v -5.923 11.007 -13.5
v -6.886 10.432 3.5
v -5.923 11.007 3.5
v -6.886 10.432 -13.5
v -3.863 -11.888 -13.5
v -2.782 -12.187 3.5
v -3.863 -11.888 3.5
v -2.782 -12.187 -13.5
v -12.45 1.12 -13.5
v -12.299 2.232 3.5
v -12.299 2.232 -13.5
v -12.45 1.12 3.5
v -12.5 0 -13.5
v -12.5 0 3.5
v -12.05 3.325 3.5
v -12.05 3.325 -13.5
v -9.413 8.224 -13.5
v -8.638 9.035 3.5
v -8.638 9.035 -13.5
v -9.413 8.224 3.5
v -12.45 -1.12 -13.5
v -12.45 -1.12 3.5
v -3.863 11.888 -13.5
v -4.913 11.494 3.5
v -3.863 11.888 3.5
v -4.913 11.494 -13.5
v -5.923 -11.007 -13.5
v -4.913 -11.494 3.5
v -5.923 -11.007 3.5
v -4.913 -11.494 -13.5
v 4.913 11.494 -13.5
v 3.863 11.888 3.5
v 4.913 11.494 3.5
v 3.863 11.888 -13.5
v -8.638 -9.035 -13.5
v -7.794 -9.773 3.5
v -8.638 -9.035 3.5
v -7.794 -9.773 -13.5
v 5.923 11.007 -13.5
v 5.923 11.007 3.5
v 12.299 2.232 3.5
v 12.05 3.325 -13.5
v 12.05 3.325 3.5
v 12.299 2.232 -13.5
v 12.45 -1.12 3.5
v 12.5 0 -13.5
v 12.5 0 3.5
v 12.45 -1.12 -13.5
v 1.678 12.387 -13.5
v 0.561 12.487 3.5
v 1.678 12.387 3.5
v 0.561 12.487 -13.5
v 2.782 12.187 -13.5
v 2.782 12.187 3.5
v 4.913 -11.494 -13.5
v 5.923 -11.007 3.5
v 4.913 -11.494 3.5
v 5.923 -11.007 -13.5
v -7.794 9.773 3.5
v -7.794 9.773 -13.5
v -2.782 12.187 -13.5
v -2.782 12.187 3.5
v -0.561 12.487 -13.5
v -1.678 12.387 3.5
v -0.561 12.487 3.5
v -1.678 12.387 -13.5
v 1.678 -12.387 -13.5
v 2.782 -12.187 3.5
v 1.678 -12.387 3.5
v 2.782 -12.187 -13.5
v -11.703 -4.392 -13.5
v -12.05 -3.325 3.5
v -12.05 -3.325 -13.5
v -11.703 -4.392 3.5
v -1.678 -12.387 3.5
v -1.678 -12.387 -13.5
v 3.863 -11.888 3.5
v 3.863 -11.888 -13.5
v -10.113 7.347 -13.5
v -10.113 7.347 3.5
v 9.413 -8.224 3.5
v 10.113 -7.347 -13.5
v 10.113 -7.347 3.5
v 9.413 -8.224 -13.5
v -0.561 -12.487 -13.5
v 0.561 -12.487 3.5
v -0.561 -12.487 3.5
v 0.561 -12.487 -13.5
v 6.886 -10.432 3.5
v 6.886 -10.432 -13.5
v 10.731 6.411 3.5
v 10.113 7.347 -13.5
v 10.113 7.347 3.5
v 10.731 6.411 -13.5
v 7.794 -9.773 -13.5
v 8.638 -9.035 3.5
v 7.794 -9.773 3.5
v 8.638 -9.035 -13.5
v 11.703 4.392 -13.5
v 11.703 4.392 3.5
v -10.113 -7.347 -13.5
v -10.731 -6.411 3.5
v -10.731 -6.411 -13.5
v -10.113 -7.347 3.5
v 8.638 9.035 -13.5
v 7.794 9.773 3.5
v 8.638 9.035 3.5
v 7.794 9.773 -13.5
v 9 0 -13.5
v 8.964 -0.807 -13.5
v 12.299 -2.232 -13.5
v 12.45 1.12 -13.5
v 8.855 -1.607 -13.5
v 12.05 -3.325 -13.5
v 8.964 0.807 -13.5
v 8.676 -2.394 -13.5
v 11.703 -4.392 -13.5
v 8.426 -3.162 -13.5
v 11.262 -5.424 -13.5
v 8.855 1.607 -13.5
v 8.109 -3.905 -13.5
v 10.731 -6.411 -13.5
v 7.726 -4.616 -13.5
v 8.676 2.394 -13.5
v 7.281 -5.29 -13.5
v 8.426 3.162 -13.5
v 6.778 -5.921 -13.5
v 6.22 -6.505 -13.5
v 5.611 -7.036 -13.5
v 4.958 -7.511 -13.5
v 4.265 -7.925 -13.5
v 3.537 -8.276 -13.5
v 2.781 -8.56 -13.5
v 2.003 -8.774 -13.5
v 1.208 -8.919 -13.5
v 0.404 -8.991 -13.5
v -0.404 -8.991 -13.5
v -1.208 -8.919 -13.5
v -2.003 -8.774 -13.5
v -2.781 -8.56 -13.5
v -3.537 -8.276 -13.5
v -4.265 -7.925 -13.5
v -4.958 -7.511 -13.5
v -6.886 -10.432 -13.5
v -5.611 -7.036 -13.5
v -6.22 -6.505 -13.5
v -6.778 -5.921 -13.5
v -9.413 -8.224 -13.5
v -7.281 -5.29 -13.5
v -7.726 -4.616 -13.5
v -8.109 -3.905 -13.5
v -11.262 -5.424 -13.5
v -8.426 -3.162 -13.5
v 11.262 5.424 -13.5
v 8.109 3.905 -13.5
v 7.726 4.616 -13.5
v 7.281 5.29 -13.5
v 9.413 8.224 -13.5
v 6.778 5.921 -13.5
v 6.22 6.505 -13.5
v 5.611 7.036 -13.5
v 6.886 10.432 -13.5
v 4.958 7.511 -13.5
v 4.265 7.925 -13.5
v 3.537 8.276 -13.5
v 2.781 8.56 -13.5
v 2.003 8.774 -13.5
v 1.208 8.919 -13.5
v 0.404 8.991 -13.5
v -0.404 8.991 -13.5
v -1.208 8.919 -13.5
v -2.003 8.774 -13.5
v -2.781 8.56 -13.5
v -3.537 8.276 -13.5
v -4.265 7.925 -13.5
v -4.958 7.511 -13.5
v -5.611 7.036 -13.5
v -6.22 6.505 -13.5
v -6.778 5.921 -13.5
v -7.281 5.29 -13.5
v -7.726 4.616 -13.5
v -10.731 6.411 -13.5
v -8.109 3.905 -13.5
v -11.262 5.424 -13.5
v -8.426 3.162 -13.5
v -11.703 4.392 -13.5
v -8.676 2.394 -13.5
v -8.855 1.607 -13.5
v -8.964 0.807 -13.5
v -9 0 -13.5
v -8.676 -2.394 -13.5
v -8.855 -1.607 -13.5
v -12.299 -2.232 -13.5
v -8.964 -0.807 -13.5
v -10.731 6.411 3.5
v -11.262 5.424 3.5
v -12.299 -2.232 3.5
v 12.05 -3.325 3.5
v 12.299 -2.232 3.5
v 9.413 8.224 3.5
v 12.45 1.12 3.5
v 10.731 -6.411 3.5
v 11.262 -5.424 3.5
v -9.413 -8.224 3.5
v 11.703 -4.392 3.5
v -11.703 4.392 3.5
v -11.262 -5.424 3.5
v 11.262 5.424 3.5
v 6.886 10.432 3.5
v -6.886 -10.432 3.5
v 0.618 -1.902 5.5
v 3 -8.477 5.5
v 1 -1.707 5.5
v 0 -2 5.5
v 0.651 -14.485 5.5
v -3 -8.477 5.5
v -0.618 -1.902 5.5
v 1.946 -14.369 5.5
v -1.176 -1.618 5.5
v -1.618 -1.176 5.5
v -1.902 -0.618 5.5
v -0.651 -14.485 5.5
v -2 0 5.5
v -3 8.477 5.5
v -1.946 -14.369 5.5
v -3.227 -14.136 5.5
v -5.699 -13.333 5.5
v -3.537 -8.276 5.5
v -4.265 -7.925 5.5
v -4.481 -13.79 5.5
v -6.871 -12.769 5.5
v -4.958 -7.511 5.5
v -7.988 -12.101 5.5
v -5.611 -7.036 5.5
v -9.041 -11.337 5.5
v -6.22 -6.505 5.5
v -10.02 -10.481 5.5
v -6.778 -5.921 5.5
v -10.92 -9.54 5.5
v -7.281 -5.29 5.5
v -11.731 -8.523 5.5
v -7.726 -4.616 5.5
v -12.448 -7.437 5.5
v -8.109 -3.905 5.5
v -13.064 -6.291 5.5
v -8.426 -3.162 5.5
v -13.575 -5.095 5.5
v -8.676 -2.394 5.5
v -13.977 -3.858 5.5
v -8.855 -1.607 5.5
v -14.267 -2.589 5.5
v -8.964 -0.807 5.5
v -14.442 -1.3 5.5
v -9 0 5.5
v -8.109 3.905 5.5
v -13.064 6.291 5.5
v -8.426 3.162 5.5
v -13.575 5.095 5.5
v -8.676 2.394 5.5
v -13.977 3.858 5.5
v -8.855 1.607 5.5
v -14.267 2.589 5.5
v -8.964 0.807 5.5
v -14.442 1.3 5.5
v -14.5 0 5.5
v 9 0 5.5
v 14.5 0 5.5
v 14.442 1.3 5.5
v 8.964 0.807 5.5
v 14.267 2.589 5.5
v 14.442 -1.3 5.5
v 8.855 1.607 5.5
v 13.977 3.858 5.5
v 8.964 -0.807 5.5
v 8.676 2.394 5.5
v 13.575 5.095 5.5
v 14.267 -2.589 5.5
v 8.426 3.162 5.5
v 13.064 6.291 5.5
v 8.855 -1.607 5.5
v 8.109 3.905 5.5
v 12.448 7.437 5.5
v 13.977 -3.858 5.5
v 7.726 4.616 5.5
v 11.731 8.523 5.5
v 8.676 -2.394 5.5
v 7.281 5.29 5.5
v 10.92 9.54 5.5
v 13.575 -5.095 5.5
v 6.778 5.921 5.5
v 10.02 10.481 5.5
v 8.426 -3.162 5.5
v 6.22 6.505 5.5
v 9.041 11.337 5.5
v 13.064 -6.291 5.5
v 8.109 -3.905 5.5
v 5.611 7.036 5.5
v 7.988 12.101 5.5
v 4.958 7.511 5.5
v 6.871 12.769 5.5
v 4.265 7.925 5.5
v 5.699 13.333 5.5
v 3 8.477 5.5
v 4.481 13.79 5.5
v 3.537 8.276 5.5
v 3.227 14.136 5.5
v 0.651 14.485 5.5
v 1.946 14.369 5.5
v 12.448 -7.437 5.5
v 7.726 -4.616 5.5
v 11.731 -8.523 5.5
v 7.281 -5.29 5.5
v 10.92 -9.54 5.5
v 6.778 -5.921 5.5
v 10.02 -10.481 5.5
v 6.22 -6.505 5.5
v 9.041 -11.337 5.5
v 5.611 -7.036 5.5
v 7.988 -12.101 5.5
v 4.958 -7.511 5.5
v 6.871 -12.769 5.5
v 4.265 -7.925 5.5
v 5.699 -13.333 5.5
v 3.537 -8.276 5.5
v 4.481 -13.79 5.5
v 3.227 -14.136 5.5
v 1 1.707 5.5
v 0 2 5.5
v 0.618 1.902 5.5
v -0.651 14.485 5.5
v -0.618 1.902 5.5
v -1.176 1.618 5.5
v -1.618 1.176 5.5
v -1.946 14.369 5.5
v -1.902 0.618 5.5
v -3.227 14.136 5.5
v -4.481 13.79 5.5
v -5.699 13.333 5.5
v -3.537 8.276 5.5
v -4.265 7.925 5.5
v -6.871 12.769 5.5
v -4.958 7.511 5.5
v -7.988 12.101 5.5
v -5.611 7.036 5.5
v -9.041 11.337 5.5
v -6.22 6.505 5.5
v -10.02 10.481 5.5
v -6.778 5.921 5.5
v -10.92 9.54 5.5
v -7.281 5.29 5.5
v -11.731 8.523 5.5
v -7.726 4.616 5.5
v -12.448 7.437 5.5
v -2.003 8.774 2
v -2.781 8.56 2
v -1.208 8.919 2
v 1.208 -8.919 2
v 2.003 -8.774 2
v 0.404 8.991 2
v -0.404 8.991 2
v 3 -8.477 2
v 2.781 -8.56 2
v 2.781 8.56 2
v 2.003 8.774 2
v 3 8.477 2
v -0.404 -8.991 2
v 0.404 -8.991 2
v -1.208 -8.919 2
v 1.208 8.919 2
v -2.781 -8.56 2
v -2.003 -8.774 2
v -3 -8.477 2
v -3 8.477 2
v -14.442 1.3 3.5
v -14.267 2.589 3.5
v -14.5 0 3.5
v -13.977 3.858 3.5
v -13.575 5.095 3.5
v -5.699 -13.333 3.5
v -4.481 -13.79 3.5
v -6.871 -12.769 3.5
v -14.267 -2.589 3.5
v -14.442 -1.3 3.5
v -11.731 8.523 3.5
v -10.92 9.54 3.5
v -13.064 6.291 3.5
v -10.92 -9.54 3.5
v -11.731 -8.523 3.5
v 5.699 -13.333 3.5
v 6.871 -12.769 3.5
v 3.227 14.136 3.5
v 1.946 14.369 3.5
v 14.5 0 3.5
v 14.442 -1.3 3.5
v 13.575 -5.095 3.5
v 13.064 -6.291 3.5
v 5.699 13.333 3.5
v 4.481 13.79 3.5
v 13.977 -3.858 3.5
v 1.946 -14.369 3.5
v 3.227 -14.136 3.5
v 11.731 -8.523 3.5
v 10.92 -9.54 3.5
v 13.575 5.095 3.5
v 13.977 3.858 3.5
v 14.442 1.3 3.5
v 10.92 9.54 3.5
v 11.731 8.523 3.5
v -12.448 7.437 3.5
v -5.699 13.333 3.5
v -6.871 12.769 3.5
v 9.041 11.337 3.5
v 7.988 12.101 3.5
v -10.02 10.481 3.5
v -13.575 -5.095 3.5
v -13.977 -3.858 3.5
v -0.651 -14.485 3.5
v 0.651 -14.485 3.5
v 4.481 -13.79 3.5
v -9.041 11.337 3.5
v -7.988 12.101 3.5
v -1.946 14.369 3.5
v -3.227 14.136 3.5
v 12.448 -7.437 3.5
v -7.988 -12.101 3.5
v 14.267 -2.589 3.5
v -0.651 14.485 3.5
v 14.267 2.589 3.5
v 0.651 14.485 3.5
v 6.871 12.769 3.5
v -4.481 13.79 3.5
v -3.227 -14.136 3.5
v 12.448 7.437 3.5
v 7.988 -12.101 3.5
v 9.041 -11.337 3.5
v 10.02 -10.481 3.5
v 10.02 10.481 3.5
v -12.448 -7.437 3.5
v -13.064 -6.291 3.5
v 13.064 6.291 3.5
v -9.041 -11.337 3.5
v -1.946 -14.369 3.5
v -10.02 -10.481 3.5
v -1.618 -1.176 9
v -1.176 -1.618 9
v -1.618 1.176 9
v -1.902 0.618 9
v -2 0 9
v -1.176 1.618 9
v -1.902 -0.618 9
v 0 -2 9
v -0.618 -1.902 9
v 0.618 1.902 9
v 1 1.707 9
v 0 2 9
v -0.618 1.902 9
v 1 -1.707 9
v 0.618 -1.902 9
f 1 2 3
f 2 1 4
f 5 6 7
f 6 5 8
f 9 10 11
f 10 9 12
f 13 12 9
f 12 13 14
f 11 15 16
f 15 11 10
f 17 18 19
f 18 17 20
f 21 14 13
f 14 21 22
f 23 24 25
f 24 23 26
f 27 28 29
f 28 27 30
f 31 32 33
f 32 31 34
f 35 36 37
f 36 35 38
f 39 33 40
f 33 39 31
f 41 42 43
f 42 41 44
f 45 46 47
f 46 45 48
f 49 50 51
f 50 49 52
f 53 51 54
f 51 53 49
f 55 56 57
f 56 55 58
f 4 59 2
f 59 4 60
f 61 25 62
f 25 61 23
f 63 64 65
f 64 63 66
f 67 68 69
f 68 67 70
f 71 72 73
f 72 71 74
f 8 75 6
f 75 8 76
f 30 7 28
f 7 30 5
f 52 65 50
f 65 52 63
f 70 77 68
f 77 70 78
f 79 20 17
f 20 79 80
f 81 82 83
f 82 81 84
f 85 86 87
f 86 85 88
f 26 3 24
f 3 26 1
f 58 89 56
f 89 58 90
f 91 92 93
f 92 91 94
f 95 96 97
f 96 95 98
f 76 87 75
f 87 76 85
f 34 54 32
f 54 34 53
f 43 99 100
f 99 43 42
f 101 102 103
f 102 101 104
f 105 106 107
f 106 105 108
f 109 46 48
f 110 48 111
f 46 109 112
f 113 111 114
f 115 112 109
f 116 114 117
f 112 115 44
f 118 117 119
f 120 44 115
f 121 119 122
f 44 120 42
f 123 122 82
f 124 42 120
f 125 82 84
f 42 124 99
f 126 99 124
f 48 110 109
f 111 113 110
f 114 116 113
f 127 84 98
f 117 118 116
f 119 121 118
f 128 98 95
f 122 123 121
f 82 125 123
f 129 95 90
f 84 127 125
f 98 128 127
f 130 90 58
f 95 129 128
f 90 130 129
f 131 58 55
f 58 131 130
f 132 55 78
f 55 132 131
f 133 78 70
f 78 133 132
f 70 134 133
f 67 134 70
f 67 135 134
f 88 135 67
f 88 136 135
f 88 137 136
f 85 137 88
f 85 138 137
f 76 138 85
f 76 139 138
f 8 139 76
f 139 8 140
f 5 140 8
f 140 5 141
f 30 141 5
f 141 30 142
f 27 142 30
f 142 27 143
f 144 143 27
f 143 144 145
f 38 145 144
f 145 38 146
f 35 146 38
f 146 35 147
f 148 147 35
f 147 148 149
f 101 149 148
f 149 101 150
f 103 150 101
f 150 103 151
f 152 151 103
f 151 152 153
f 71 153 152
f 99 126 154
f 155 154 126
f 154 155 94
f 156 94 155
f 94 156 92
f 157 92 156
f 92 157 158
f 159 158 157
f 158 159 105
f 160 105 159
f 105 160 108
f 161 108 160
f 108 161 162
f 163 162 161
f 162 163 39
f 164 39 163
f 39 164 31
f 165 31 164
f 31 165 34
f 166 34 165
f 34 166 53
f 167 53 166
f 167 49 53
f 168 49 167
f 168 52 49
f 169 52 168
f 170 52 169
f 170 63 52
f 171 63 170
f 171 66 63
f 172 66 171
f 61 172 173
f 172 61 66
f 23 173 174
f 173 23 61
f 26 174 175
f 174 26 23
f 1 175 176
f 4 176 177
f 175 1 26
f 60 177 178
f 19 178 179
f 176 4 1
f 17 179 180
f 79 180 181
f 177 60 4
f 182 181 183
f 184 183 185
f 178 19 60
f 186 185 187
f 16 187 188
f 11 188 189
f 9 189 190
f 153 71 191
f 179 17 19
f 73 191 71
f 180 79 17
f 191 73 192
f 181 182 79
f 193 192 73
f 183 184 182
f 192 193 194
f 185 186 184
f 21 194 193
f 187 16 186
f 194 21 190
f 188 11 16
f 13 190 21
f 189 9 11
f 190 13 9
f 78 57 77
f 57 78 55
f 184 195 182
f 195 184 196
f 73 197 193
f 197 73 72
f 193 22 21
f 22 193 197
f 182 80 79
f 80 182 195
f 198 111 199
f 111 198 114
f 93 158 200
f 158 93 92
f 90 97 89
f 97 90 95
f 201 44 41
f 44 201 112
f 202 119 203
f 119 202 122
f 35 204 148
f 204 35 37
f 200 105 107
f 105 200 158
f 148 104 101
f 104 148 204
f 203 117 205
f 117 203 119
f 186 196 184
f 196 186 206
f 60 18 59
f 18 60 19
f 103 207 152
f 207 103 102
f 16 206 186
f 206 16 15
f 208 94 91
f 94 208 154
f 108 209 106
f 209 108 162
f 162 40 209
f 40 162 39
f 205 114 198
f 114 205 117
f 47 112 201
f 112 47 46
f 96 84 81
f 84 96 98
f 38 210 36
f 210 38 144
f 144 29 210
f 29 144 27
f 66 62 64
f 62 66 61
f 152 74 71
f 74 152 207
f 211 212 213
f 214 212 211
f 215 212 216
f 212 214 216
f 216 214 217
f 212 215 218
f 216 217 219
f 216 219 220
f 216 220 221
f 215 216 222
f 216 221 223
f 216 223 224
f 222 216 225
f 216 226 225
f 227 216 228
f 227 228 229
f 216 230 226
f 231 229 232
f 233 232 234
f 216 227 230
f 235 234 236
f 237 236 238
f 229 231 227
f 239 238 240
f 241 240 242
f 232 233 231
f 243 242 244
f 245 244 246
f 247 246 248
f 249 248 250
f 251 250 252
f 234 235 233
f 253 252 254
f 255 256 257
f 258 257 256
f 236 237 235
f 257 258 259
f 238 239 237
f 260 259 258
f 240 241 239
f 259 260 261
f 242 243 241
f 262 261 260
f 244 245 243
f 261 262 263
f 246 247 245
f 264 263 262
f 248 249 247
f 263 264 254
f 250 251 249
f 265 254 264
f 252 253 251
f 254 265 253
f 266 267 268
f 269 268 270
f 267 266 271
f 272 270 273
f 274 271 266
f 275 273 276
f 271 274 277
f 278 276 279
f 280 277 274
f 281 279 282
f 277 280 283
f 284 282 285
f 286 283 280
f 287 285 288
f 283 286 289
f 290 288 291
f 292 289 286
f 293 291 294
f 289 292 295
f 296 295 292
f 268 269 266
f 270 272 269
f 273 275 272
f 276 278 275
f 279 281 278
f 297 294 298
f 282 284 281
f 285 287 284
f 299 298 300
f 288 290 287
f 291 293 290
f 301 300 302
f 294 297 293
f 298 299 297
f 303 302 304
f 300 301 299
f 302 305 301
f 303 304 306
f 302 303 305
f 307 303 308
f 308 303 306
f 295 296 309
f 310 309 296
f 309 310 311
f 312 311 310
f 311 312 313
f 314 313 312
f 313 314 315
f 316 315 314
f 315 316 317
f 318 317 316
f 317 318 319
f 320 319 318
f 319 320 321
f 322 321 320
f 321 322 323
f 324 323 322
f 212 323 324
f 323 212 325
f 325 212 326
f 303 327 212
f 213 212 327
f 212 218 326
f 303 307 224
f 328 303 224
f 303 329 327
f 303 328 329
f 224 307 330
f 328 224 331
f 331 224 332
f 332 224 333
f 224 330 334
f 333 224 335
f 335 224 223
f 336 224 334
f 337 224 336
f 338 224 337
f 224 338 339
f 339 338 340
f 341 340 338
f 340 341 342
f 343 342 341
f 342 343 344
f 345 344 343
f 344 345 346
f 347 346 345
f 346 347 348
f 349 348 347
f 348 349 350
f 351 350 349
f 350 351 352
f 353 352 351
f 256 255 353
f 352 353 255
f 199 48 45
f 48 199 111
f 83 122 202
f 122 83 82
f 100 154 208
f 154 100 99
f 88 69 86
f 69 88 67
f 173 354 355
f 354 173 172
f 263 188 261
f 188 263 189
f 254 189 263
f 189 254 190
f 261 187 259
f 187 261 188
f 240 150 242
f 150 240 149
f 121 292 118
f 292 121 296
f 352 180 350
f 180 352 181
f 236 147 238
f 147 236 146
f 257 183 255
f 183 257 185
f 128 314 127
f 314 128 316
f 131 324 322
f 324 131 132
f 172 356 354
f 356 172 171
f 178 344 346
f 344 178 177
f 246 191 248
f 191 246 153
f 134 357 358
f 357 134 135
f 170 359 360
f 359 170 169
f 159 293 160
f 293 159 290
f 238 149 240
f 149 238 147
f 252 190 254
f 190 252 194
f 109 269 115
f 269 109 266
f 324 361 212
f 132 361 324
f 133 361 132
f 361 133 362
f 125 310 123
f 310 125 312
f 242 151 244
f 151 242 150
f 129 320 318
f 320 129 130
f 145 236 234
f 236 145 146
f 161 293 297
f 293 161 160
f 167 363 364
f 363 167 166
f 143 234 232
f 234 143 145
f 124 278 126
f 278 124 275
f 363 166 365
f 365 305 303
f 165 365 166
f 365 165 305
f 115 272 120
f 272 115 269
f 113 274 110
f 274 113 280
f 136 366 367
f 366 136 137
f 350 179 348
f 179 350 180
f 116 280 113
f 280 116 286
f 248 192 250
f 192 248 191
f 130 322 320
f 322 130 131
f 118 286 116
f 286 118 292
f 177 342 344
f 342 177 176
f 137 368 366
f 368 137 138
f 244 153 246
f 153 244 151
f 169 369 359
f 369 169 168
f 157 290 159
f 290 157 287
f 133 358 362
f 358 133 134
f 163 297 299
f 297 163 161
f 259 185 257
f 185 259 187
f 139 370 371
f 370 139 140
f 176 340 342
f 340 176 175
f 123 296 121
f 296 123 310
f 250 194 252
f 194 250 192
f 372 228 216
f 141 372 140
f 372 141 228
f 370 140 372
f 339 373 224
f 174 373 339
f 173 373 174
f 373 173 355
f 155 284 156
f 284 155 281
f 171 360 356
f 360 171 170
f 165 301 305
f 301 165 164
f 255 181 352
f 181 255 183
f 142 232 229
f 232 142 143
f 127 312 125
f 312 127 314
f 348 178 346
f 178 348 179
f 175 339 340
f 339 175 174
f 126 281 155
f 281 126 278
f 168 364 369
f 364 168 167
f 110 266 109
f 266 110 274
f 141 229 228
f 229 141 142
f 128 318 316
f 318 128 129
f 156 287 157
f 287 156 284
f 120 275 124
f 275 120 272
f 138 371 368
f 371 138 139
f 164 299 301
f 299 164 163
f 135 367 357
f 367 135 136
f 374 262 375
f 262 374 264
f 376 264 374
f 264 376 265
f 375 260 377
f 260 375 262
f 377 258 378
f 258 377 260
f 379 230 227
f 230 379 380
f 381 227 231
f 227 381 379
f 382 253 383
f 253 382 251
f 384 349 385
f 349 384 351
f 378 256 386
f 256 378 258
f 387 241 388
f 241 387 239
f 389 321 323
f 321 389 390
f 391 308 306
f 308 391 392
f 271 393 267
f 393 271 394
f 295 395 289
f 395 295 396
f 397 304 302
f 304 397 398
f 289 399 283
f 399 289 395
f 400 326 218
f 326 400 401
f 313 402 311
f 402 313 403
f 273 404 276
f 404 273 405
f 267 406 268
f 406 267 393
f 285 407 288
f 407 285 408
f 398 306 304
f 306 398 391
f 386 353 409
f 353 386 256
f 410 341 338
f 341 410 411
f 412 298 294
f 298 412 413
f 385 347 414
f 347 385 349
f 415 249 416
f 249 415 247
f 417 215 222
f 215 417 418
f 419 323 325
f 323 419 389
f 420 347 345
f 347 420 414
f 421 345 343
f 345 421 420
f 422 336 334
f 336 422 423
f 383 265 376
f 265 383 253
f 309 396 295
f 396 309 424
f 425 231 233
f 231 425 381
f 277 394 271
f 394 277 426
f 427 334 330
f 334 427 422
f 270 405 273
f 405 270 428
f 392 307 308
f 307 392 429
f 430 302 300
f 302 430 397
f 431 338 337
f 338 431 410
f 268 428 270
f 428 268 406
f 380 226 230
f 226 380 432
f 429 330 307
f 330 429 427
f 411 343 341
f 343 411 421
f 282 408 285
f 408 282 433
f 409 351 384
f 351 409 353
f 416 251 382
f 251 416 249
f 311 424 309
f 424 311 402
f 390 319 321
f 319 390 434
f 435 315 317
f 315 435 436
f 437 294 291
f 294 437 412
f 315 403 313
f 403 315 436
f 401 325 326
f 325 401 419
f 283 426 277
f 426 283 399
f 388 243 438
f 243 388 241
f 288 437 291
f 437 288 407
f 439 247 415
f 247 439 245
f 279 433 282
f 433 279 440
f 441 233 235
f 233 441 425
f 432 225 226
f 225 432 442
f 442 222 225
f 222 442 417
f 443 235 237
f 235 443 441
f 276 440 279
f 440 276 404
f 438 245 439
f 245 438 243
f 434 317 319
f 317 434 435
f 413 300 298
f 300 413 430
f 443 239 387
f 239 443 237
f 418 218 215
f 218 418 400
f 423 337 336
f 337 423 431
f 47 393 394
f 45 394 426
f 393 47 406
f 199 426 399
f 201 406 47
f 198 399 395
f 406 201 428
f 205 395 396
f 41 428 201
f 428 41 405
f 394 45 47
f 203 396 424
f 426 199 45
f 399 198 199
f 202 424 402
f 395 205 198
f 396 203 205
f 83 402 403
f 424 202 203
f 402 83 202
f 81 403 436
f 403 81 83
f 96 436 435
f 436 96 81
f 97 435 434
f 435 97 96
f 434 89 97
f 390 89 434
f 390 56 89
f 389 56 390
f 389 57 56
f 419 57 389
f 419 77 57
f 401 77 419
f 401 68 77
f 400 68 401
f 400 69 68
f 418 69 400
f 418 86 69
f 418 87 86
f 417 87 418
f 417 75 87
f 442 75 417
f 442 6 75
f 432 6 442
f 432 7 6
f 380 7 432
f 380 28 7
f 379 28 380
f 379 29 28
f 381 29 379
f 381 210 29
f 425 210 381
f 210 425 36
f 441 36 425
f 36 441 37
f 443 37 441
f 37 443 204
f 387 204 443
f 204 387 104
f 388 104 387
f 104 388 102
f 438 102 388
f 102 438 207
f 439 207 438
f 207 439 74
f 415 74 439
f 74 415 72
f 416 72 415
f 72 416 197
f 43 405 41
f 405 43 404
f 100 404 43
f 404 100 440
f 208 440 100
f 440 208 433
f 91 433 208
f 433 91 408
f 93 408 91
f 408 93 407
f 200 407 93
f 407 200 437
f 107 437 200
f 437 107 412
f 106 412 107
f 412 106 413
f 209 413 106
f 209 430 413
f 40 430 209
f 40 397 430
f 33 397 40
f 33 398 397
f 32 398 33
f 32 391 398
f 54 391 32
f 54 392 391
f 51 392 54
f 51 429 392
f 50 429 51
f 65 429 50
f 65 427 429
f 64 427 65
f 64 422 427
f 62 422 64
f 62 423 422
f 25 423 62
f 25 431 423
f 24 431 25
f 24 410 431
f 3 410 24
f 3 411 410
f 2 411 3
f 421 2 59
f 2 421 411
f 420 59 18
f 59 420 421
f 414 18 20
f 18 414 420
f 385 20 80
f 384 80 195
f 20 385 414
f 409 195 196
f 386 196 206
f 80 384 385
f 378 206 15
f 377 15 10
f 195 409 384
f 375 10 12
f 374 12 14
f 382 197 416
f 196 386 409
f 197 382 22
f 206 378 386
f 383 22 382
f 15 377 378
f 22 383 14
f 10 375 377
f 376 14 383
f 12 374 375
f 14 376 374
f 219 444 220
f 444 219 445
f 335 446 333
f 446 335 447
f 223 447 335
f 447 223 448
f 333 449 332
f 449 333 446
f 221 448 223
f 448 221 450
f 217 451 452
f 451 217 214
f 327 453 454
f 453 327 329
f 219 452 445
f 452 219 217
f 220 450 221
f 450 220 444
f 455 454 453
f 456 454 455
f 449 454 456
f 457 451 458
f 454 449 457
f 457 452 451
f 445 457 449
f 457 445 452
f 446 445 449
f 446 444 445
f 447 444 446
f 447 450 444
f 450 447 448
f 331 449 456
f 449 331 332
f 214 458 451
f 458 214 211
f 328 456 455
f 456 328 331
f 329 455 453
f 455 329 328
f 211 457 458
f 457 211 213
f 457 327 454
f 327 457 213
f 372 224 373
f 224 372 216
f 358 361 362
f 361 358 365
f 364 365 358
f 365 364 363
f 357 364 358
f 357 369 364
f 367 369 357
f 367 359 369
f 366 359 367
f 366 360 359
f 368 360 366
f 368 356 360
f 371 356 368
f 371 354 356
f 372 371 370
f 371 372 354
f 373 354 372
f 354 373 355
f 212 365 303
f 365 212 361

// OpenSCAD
// file: ../../lib/sensor.scad
//rotationSensor();
//rotationSensorSpacing();

module rotationSensor(){
	//Digi-Key Part Number: 490-2400-ND
	//Manufacturer Part Number: SV01A103AEA01B00
	
	roatationSensorBody();
	
	translate([-6.5, -2.5, -0.6])
		cube([1.5, 0.8, 0.2], center = true);
		
	translate([-6.5, 0, -0.6])
		cube([1.5, 0.8, 0.2], center = true);		
		
	translate([-6.5, 2.5, -0.6])
		cube([1.5, 0.8, 0.2], center = true);		
		
	translate([6.5, 0, -0.6])
		cube([1.5, 0.8, 0.2], center = true);				
}

module roatationSensorBody(inflate = false) {
	x1 = inflate ? 1 : 0;
	x2 = inflate ? 0.25 : 0;
	x3 = inflate ? 0.5 : 0;

	difference()
	{
		cube ([12 + x1, 11 + x1, 2 + x3], center = true);
		
		//translate([0.5, 0, 0]) 
		difference() 
		{
			cylinder(h = 5, d1 = 4, d2 = 4, center = true, $fn = 15);
			translate([3, 0, 0]) cube([4, 4, 4], center = true);
		}
		
		translate([8 + x2, 7.5 + x2, 0])
		rotate([0, 0, 45]) 
			cube([10, 10, 5], center = true);
		
		translate([8 + x2, -7.5 - x2, 0])
		rotate([0, 0, -45]) 
			cube([10, 10, 5], center = true);
		
		//translate([-8.7 - x2, 8.7 + x2, 0])
		//rotate([0, 0, 45]) 
		//	cube([10, 10, 5], center = true);
		
		//translate([-8.7 - x2, -8.7 - x2, 0])
		//rotate([0, 0, -45]) 
		//	cube([10, 10, 5], center = true);				
	}
}

module rotationSensorSpacing() {
	translate([0, 0, 1])
		roatationSensorBody(inflate = true);
	
	cylinder(h = 10, d = 6, $fn = 15);
	
	translate([-7.5, 0, 0])
		cube ([2, 8.5, 15], center = true);

	translate([-5.5, 5, 2.5])
		cube ([2, 2, 1], center = true);
		
	translate([-5.5, -5, 2.5])
		cube ([2, 2, 1], center = true);
}
// file: ../../lib/pulley.scad
additionalToothWidth = 0.2; //mm
additionalToothHeight = 0; //mm

//pulley (teeth = 100, height = 10);

module pulley(teeth, height, center = false) {
	toothDepth = 0.508;
	toothWidth =  1.321;
	toothPitch = 2.032;
	pitchLineOffset = 0.254;
	pulleyD = 2*((teeth*toothPitch)/(3.14159265*2)-pitchLineOffset);
	toothDistanceFromCentre = sqrt( pow(pulleyD/2,2) - pow((toothWidth+additionalToothWidth)/2,2));
	toothWidthScale = (toothWidth + additionalToothWidth ) / toothWidth;
	toothDepthScale = ((toothDepth + additionalToothHeight ) / toothDepth) ;
	
	difference()
	{
		union()
		{
			cylinder(d=pulleyD,h=height, $fn=teeth*4, center = center);
			
			translate([0, 0, height/2])
				cylinder(d=pulleyD + 2,h=2, $fn=teeth*4);
				
			translate([0, 0, -height/2 - 2])
				cylinder(d=pulleyD + 2,h=2, $fn=teeth*4);				
		}
			
		for(i=[1:teeth])
		{			
			rotate([0,0,i*(360/teeth)])
			translate([0,-toothDistanceFromCentre,-height/2]) 
			scale ([ toothWidthScale , toothDepthScale , 1 ]) 
			tooth(height);
		}
	}
}
			
module tooth(height) {
	linear_extrude(height=height) 
		polygon([[-0.660421,-0.5],[-0.660421,0],[-0.621898,0.006033],[-0.587714,0.023037],[-0.560056,0.049424],[-0.541182,0.083609],[-0.417357,0.424392],[-0.398413,0.458752],[-0.370649,0.48514],[-0.336324,0.502074],[-0.297744,0.508035],[0.297744,0.508035],[0.336268,0.502074],[0.370452,0.48514],[0.39811,0.458752],[0.416983,0.424392],[0.540808,0.083609],[0.559752,0.049424],[0.587516,0.023037],[0.621841,0.006033],[0.660421,0],[0.660421,-0.5]]);
}
// file: ../../lib/ballBearing.scad
//ballBearingHolder(28, 8, 4);

module ballBearing6707(){
	//35x44x5
	ballBearing(inner = 35, outer = 44, height = 5);
}

module ballBearing6706(){
	//30x37x4
	ballBearing(inner = 30, outer = 37, height = 4);
}

module ballBearing6705() {
	// 25x32x4
	ballBearing(inner = 25, outer = 32, height = 4);
}


module ballBearing8607() {
	// 35x47x7
	ballBearing(inner = 35, outer = 47, height = 7);
}

module ballBearing6806(){
	// 30x42x7
	ballBearing(inner = 30, outer = 42, height = 7);
}

module ballBearing6805() {
	// 25x37x7
	ballBearing(inner = 25, outer = 37, height = 7);
}

module ballBearing6804() {
	//20x32x7
	ballBearing(inner = 20, outer = 32, height = 7);
}

module ballBearing(inner, outer, height) {
	difference()
	{
		cylinder(d = outer, h = height, center = true, $fn = 50);
		cylinder(d = inner, h = height + 2, center = true, $fn = 50);
	}
}

module ballBearingHolder(outer, h, thickness) {
    difference(){
        cylinder(h = h + 2, d1 = outer + thickness * 2, d2 = outer + thickness * 2);
        
        translate([0, 0, 2]) 
            cylinder(h = h+1, d1 = outer, d2 = outer);
        
        translate([0, 0, -1])
            cylinder(h = h + 4, d1 = outer - 4, d2 = outer - 4); 
    }
}
// file: ../../lib/shapes.scad
//Draw a prism based on a 
//right angled triangle
//l - length of prism
//w - width of triangle
//h - height of triangle

module prism(l, w, h) {
       polyhedron(points=[
               [0,0,h],           // 0    front top corner
               [0,0,0],[w,0,0],   // 1, 2 front left & right bottom corners
               [0,l,h],           // 3    back top corner
               [0,l,0],[w,l,0]    // 4, 5 back left & right bottom corners
       ], faces=[ // points for all faces must be ordered clockwise when looking in
               [0,2,1],    // top face
               [3,4,5],    // base face
               [0,1,4,3],  // h face
               [1,2,5,4],  // w face
               [0,3,5,2],  // hypotenuse face
       ]);
}

//The top point will be centred
module pyramid(w, l, h) {
	mw = w/2;
	ml = l/2;
	polyhedron(points = [
		[0,  0,  0],
		[w,  0,  0],
		[0,  l,  0],
		[w,  l,  0],
		[mw, ml, h]
	], faces = [
		[4, 1, 0],
		[4, 3, 1],
		[4, 2, 3],
		[4, 0, 2],
		//base
		[0, 1, 2],
		[2, 1, 3]
	]);
}

//pyramid(4,4,4);

//A cuboid with a tapered top
//w - width
//l - length
//h - height
//taper - how much to taper the each edge at the top by

module tapered_cuboid(w, l, h, taper) {
	ho = taper;
	hw = w - taper;
	hl = l - taper;
	polyhedron( points=[
		[ 0,  0, 0],
		[ho, ho, h],
		[hw, ho, h],
		[ w,  0, 0],
		[ 0,  l, 0],
		[ho, hl, h],
		[hw, hl, h],
		[ w,  l, 0] 
	], faces = [
		[0, 1, 2],
		[2, 3, 0],
		[3, 2, 6],
		[6, 7, 3],
		[7, 6, 5],
		[5, 4, 7],
		[4, 5, 1],
		[1, 0, 4],
		[1, 5, 2],
		[2, 5, 6],
		[4, 0, 3],
		[7, 4, 3],
	] );
}

module ring(d, h, t, center = true)
{
    difference()
    {
        cylinder(h = h, d = d + t * 2, center = center);
		translate([0, 0, center ? 0 : -1])
			cylinder(h = h + 2, d = d, center = center);
    }
}

module ringDiamond(d, h)
{
	rotate_extrude(convexity = 10)
	translate([d/2, 0, 0])
	rotate([0, 0, 45])
		square(size = [h, h], center = true);
}

module ringSector(d, h, t, a1, a2)
{
    intersection()
    {
        $fn=100;
        ring(d, h, t);
        translate([0, 0, -1]) rotate([0, 0, 90+a1]) cube([d, d, h + 2]);
        translate([0, 0, -1])rotate([0, 0, a2]) cube([d, d, h + 2]);
    }
}

module torus(d, w)
{
    rotate_extrude(convexity = 1)
    translate([d / 2, 0, 0])
        circle(d = w);
}

module rod(a, b, d) // a and b are coordinates of ends, d is diameter
{ 
    translate(a) sphere(d = d); 
    translate(b) sphere(d = d); 

    dir = b-a; 
    h   = norm(dir); 
    if(dir[0] == 0 && dir[1] == 0) { 
        // no transformation necessary 
        cylinder(d = d, h=h); 
    } 
    else { 
        w  = dir / h; 
        u0 = cross(w, [0,0,1]); 
        u  = u0 / norm(u0); 
        v0 = cross(w, u); 
        v  = v0 / norm(v0); 
        multmatrix(m=[[u[0], v[0], w[0], a[0]], 
                      [u[1], v[1], w[1], a[1]], 
                      [u[2], v[2], w[2], a[2]], 
                      [0,    0,    0,    1]]) 
        cylinder(d = d, h=h); 
    } 
} 

module shayba(h, d, rd){
	hull()
	{
		translate([0, 0, h/2 - rd/2])
			torus(d = d - rd, w = rd);
			
		translate([0, 0, -h/2 + rd/2])
			torus(d = d - rd, w = rd);			
	}
}

module halfShayba(h, d, rd){
	intersection()
	{
		shayba(h = h * 2, d = d, rd = rd);
		cylinder(h = h + 1, d1 = d + 1, d2 = d + 1);
	}
}

module dCylinder(h, d, x){
	intersection() 
	{
		cylinder(h = h, d1 = d, d2 = d, center = true);
		translate([x, 0, 0]) cube([d, d, h + 1], center = true);
	}
}

module sphereSector(d, w, a) {
	intersection()
	{
		difference()
		{
			sphere(d = d);
			sphere(d = d - w * 2);
		}
		cylinder(h = d + 1, d1 = 0, d2 = d * tan(a));
	}
}

module cylinderSector(d, h, angle) {
	rotate_extrude(angle=angle, convexity=10)
		square(size = [d/2, h]);
}
// file: ../_sizes.scad
h1 = 200;
h2 = 150;

belt = 10;

th = 3.5;
thEdge = 2; // ball bearing holder

bbi = 25;
bbo = 37;
bbh = 7;
// file: ../_shared.scad
include <_sizes.scad>
use <../lib/shapes.scad>
use <../lib/ballBearing.scad>
use <../lib/pulley.scad>
use <../lib/sensor.scad>

difference()
{
	bearingOuter();
	translate([-50, 0, 0])
	cube ([100, 100, 100]);
}

module bearingOuter(withPulley = true) {
	translate([-thEdge/2, 0, 0])
	rotate([0, -90, 0])
		if (withPulley)
		{
			difference()
			{
				pulley(teeth=70, height = belt, center = true);
				cylinder(d = bbo, h = belt + 5, $fn = 70, center = true);
			}
		}
		else
		{
			ring(d = bbo, t = th, h = bbh + thEdge, $fn = 70);
		}

	// this stops the bearing
	
	translate([(-bbh - thEdge - 1) / 2, 0, 0])
	rotate([0, -90, 0])
		ring(d = bbo - thEdge * 2, t = thEdge * 2, h = thEdge + 1, $fn = 70);
		
	// sensor holder
	
	translate([(-bbh - th) / 2 - 1, 0, 0])
	rotate([0, -90, 0])
	difference()
	{
		cylinder(h = th, d = bbo);
		
		rotationSensorSpacing();
		
		translate([0, 11, 0])
			cylinder (d =6, h = 10, center = true);

		translate([0, -11, 0])
			cylinder (d =6, h = 10, center = true);
	}
}

module bearingInner(showBearing = true) {
	outside = 10;

	if (showBearing)
	{
		color("white")
		rotate([0, -90, 0])
			ballBearing(inner = bbi, outer = bbo, height = bbh);
	}
		
	// inner

	translate([(outside - thEdge) / 2, 0, 0])
	rotate([0, 90, 0])
		ring(d = bbi - th * 2, t = th, h = bbh + outside + thEdge, $fn = 70);
		
	translate([(-bbh - thEdge) / 2, 0, 0])
	rotate([0, 90, 0])
	{
		ring(d = bbi, t = thEdge, h = thEdge, $fn = 70);
		
		translate([0, 0, (th - thEdge) / 2])
			cube([6, bbi - 2, th], center = true);
			
		translate([0, 0, -2])
		dCylinder(h = 5, d = 4, x = 1, $fn = 20);	
	}
}
// main file
use <../_shared.scad>

rotate([0, 90, 0])
bearingInner(showBearing = false);
